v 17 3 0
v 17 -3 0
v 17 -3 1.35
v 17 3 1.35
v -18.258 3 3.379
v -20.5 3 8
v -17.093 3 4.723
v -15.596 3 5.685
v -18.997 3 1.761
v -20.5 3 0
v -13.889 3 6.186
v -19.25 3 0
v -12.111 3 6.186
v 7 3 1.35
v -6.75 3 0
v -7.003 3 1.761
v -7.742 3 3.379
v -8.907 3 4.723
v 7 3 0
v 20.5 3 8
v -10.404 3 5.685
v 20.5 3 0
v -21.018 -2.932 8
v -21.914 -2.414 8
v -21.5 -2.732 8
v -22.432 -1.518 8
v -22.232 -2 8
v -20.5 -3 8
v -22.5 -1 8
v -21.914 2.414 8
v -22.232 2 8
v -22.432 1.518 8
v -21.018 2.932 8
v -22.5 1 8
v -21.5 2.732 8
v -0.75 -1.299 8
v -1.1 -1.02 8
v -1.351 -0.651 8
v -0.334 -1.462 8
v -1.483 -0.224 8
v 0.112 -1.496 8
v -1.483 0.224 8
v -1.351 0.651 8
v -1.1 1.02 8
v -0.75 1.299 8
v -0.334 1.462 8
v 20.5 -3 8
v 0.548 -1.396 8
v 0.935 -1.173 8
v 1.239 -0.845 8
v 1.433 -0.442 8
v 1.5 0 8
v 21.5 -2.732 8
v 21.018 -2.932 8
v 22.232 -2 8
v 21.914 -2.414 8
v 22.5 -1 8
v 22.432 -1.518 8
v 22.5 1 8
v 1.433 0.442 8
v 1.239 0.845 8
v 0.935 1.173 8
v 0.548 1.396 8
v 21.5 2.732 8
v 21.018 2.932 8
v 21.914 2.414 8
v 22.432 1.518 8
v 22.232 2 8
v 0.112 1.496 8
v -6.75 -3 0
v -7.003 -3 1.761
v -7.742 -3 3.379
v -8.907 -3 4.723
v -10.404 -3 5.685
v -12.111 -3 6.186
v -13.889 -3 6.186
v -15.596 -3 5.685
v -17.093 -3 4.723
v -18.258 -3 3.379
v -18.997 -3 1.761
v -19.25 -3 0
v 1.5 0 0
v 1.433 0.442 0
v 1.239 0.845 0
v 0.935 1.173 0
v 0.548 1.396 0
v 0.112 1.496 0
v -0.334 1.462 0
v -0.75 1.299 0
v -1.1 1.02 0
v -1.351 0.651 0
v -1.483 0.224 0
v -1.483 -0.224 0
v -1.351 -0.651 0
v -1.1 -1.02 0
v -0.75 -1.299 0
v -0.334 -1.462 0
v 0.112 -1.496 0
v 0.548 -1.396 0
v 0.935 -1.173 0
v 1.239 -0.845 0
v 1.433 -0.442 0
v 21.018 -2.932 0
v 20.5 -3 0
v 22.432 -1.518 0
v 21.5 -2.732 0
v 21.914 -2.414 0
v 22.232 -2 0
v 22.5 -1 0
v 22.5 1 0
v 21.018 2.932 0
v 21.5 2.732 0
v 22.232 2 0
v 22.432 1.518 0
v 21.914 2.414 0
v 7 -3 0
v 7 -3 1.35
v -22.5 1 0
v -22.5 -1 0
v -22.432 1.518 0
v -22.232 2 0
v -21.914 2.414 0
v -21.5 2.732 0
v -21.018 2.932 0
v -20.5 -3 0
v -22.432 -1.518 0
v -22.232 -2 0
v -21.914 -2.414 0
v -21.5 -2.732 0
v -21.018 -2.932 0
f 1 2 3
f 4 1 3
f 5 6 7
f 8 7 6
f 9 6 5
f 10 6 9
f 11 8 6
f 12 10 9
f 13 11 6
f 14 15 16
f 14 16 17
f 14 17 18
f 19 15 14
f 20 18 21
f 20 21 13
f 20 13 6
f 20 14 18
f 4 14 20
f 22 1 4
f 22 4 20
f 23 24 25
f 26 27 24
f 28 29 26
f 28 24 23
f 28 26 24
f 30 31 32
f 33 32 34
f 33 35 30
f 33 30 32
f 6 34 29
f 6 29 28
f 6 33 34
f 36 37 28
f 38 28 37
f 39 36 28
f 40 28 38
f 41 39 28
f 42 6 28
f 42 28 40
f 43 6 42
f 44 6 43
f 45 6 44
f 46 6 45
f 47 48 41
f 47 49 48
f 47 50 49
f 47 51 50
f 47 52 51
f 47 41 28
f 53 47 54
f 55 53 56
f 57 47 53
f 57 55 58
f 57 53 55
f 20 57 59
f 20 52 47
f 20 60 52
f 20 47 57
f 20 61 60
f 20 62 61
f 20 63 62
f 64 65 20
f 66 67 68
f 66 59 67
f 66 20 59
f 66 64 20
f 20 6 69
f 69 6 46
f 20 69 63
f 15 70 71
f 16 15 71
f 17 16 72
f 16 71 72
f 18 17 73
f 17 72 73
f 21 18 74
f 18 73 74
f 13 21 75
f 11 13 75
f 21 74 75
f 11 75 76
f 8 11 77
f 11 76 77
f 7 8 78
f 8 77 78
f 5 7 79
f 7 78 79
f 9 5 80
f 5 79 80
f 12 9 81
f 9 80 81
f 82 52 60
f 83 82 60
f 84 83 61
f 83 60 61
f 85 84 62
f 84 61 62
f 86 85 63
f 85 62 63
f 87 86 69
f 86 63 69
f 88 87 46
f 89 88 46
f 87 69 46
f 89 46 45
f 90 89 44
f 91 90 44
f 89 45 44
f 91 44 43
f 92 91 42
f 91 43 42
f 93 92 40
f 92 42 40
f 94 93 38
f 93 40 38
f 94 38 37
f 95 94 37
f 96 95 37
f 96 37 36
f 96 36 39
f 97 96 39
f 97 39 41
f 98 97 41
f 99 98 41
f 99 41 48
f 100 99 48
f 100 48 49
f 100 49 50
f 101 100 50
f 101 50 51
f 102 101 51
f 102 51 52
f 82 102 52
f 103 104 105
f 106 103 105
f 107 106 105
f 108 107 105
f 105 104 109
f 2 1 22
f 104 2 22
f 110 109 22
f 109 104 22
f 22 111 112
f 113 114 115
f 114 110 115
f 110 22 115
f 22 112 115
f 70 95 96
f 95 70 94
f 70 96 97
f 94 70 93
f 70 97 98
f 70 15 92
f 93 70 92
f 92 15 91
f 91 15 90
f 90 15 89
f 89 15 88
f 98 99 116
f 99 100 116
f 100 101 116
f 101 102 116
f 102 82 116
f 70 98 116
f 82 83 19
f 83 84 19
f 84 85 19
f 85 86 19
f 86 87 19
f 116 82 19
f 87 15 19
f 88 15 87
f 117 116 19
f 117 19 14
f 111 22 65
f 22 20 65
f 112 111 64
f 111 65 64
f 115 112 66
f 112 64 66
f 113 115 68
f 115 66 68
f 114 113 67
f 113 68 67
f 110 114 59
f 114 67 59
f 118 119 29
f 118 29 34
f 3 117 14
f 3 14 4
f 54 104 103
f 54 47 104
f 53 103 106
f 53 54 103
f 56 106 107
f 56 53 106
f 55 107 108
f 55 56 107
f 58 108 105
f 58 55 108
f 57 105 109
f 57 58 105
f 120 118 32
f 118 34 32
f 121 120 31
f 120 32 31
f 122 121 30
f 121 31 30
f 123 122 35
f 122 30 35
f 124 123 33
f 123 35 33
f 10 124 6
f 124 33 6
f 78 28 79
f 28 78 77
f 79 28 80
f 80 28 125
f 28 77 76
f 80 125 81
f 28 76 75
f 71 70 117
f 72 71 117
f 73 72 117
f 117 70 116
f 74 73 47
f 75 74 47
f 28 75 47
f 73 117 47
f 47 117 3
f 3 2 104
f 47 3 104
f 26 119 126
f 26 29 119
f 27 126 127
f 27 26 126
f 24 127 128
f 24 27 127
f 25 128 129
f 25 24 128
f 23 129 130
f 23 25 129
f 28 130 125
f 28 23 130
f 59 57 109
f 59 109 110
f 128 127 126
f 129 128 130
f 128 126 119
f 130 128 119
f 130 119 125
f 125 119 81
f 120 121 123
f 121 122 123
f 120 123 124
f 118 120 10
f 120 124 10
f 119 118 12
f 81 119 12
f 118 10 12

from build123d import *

# Parameters (mm, degrees)
F0_W     = 45
F0_H     = 6
F1_DEPTH = 8
F2_W     = 10
F2_H     = 1.35
F3_DEPTH = 6.001
F4_R     = 1.5
F5_DEPTH = 8.001
F6_R     = 2


with BuildPart() as f1:
    # F0 (on Top) → F1 (new body)
    with BuildSketch(Plane.XY):
        Rectangle(F0_W, F0_H)
    extrude(amount=F1_DEPTH)

    # F2 (on face) → F3 (cut, through all)
    with BuildSketch(Plane.XZ.offset(3)):
        with BuildLine():
            Line((-19.25, 0), (-6.75, 0))
            ThreePointArc((-6.75, 0), (-13, 6.25), (-19.25, 0))
        make_face()
        with Locations((12, 0.675)):
            Rectangle(F2_W, F2_H)
    extrude(amount=-F3_DEPTH, mode=Mode.SUBTRACT)

    # F4 (on face) → F5 (cut, through all)
    with BuildSketch(Plane.XY.offset(8)):
        Circle(F4_R)
    extrude(amount=-F5_DEPTH, mode=Mode.SUBTRACT)

    # F6
    f6_edges = [f1.edges().sort_by_distance(p)[0] for p in [
        (-22.5, -3, 4),
        (-22.5, 3, 4),
        (22.5, -3, 4),
        (22.5, 3, 4),
    ]]
    fillet(f6_edges, radius=F6_R)


solid = f1.part
